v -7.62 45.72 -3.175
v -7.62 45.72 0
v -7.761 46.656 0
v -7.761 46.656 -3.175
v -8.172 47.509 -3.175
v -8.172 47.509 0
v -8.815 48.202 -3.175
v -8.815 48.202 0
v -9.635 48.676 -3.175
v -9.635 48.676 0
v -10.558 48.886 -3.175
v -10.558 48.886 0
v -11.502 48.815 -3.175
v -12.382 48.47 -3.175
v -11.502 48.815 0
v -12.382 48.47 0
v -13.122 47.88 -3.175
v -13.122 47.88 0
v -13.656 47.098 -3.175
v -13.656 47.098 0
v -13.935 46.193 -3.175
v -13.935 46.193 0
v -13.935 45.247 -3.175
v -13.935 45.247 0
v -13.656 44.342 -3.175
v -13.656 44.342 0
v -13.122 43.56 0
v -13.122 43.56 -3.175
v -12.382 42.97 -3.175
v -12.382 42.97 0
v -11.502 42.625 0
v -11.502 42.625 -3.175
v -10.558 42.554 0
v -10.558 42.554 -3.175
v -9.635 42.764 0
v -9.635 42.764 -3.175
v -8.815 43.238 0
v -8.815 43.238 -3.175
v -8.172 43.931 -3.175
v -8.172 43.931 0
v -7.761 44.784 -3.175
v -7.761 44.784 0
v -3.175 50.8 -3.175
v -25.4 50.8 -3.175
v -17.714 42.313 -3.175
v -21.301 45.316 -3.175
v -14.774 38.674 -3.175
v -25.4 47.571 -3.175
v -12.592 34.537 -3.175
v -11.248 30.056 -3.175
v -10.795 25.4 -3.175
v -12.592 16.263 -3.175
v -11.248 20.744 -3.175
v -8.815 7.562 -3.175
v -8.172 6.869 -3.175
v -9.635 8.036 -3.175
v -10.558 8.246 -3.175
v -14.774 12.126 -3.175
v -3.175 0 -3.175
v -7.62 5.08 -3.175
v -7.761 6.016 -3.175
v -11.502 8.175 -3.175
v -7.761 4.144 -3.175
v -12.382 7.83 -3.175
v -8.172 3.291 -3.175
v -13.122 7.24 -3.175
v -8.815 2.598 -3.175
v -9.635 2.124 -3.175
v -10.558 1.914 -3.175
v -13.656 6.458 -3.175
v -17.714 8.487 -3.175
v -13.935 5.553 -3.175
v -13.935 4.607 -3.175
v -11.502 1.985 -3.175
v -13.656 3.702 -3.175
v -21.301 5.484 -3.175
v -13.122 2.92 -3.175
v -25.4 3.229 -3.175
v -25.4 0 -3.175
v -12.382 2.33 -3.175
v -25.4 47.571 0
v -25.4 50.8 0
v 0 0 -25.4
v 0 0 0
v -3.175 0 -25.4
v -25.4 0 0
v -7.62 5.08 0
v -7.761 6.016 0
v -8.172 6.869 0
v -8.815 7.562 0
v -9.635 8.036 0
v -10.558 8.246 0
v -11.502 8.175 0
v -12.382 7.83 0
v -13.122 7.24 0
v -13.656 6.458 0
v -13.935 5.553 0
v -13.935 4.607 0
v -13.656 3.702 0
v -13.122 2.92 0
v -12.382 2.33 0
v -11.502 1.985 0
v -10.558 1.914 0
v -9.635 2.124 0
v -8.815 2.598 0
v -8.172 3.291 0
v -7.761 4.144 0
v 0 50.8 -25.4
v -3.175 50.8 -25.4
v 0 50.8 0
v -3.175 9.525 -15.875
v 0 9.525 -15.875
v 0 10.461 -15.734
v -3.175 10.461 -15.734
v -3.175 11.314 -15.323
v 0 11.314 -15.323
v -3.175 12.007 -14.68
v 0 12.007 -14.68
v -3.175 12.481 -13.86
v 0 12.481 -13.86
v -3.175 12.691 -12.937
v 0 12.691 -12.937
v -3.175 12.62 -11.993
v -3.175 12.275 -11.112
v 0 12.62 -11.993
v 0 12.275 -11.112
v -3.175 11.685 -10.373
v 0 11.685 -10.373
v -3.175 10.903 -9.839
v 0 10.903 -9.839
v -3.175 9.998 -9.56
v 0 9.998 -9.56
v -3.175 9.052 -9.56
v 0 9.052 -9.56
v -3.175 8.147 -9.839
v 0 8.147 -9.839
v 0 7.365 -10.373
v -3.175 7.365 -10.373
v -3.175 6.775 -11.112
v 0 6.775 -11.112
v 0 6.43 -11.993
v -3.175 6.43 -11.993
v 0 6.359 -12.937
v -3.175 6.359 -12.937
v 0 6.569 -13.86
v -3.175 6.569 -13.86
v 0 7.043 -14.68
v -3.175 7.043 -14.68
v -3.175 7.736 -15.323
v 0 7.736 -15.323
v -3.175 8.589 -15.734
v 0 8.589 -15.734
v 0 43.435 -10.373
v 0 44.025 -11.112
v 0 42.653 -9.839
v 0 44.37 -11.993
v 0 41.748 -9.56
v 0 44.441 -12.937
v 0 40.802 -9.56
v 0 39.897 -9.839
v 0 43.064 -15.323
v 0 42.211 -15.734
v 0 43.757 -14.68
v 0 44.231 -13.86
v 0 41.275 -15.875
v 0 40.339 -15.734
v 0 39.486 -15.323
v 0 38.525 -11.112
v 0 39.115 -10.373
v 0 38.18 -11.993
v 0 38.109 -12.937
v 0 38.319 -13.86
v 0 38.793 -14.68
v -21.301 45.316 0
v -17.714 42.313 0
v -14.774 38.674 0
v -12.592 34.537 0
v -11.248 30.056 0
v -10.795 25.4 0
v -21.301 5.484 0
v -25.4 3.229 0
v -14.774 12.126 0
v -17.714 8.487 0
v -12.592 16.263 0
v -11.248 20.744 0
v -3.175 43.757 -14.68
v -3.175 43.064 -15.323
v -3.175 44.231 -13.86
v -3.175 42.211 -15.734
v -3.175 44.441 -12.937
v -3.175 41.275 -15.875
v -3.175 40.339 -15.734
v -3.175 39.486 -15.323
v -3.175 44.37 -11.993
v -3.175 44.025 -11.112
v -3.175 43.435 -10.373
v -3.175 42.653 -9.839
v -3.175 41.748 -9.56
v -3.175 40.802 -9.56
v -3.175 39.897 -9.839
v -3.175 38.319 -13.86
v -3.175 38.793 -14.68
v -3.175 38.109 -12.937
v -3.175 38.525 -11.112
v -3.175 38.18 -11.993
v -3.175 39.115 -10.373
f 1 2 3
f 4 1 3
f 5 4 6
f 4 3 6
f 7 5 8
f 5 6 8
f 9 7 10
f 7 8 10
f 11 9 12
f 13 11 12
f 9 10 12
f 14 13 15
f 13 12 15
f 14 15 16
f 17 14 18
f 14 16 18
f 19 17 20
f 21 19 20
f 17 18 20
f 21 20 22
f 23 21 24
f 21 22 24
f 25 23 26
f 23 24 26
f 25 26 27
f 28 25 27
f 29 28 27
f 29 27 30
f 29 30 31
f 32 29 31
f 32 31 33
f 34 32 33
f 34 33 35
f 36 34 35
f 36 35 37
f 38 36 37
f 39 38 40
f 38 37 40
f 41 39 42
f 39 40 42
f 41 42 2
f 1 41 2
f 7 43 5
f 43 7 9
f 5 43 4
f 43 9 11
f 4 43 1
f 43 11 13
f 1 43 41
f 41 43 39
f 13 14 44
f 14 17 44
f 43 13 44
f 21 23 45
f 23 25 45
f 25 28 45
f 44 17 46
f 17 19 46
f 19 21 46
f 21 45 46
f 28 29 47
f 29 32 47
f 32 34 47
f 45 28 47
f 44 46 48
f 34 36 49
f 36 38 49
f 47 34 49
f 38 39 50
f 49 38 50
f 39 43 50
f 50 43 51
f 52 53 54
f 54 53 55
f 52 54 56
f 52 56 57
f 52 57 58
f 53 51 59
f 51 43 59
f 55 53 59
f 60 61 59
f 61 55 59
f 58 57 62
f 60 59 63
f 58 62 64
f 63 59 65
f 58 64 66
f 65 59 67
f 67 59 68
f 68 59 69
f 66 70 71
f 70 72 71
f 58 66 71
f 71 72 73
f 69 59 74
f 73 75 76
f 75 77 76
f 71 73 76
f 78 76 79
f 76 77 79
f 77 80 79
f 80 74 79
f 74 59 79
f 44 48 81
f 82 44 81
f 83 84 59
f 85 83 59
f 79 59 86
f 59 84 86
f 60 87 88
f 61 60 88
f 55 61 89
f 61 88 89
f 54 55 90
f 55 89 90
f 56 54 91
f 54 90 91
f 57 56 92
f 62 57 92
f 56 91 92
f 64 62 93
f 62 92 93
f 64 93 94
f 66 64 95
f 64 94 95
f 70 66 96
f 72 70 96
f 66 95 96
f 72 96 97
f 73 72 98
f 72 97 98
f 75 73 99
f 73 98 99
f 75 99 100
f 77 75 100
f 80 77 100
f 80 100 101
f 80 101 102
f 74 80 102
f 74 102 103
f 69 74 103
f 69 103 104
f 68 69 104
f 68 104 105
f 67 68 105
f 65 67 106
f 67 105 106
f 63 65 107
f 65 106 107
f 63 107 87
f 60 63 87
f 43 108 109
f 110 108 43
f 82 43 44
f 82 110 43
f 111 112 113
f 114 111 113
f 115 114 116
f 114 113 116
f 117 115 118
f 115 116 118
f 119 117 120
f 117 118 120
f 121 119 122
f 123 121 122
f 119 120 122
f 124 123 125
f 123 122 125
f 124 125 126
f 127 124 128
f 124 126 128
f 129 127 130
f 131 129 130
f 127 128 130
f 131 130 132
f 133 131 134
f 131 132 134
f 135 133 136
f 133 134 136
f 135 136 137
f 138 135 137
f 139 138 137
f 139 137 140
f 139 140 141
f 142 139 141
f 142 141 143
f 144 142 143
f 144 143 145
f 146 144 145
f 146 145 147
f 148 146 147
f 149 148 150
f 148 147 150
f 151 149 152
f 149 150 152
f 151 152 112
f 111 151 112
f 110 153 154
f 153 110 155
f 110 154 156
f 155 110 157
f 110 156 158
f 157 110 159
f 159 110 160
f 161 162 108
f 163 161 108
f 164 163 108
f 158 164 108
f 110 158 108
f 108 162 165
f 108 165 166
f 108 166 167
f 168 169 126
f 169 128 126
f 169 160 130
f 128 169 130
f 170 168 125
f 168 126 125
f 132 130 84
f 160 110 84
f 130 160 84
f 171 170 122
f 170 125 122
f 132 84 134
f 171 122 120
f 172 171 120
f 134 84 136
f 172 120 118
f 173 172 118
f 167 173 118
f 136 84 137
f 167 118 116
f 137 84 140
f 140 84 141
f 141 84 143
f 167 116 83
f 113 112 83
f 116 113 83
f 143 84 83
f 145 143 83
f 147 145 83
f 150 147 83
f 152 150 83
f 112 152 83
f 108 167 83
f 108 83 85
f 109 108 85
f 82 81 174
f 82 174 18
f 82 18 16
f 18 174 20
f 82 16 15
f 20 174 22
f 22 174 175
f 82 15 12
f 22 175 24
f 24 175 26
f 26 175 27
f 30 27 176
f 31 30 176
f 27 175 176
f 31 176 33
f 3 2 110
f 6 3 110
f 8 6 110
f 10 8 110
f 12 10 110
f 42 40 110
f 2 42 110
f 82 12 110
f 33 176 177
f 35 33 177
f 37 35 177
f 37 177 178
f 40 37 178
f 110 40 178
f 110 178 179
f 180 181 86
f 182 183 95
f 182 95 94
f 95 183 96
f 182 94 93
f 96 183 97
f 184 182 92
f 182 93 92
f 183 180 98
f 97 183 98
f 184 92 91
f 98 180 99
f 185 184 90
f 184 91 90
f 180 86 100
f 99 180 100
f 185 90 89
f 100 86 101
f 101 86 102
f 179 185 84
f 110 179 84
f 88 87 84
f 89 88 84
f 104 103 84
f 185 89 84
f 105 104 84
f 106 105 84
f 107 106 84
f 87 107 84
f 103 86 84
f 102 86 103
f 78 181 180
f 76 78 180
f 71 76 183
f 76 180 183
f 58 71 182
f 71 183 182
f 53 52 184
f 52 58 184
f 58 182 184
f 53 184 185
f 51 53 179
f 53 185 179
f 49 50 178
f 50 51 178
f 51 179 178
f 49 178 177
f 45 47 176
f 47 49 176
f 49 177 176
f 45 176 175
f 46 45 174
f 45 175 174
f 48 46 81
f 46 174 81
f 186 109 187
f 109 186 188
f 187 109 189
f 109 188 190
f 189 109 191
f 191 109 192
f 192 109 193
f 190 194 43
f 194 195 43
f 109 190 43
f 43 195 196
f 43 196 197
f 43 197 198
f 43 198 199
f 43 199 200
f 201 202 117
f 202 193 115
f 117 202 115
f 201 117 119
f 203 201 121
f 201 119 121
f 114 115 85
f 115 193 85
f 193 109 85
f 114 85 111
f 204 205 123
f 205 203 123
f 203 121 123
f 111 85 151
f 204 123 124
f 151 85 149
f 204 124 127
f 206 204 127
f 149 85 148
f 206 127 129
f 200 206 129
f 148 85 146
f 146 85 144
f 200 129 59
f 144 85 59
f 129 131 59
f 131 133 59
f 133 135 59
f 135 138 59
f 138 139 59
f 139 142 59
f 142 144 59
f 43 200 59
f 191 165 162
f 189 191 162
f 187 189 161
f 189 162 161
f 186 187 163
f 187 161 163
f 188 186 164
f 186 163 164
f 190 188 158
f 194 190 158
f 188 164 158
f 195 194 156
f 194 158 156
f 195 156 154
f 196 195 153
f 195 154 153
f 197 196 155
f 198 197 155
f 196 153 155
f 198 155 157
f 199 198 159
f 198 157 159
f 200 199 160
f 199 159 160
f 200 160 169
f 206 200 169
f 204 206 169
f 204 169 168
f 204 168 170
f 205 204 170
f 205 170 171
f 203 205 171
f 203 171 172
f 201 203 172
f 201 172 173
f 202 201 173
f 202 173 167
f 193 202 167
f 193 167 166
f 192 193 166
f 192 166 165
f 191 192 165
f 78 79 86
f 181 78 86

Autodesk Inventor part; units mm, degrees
ref_plane "YZ Plane" through (0, 0, 0) normal (1, 0, 0) x (0, 1, 0)
ref_plane "XZ Plane" through (0, 0, 0) normal (0, 1, 0) x (-1, 0, 0)
ref_plane "XY Plane" through (0, 0, 0) normal (0, 0, 1) x (1, 0, 0)
sketch "Sketch1" plane through (0, 0, 0) normal (0, 1, 0) x (-1, 0, 0)
  line L0 (0, 0) -> (0, -25.4)
  line L1 (0, -25.4) -> (3.175, -25.4)
  line L2 (3.175, -25.4) -> (3.175, -3.175)
  line L3 (3.175, -3.175) -> (25.4, -3.175)
  line L4 (25.4, -3.175) -> (25.4, 0)
  line L5 (25.4, 0) -> (0, 0)
  dimension "d0" = 25.4
  dimension "d1" = 3.175
  dimension "d2" = 22.225
  dimension "d3" = 22.225
extrude "Extrusion1" add sketch "Sketch1" along normal blind 50.8
sketch "Sketch2" plane through (-25.4, 0, 0) normal (0, 0, 1) x (1, 0, 0)
  line L0 (22.225, 0) -> (22.225, 50.8) projected
  line L1 (22.225, 0) -> (0, 0) projected
  line L2 (22.225, 50.8) -> (0, 50.8) projected
  circle A0 centre (14.605, 45.72) radius 3.175
  circle A1 centre (14.605, 5.08) radius 3.175
  circle A2 centre (-9.525, 25.4) radius 24.13
  line L3 (25.4, 0) -> (22.225, 0) projected
  dimension "d9" = 6.35
  dimension "d10" = 6.35
extrude "Extrusion2" cut sketch "Sketch2" against normal blind 63.5
sketch "Sketch3" plane through (0, 0, 0) normal (1, 0, 0) x (0, 0, -1)
  line L0 (25.4, 0) -> (25.4, 50.8) projected
  line L1 (0, 3.2295) -> (0, 47.5705) projected
  line L2 (0, 50.8) -> (25.4, 50.8) projected
  line L3 (25.4, 0) -> (3.175, 0) projected
  circle A0 centre (12.7, 9.525) radius 3.175
  circle A1 centre (12.7, 41.275) radius 3.175
  point P0 (0, 0)
extrude "Extrusion3" cut sketch "Sketch3" against normal blind 63.5
properties part number "Frame Bracket"
